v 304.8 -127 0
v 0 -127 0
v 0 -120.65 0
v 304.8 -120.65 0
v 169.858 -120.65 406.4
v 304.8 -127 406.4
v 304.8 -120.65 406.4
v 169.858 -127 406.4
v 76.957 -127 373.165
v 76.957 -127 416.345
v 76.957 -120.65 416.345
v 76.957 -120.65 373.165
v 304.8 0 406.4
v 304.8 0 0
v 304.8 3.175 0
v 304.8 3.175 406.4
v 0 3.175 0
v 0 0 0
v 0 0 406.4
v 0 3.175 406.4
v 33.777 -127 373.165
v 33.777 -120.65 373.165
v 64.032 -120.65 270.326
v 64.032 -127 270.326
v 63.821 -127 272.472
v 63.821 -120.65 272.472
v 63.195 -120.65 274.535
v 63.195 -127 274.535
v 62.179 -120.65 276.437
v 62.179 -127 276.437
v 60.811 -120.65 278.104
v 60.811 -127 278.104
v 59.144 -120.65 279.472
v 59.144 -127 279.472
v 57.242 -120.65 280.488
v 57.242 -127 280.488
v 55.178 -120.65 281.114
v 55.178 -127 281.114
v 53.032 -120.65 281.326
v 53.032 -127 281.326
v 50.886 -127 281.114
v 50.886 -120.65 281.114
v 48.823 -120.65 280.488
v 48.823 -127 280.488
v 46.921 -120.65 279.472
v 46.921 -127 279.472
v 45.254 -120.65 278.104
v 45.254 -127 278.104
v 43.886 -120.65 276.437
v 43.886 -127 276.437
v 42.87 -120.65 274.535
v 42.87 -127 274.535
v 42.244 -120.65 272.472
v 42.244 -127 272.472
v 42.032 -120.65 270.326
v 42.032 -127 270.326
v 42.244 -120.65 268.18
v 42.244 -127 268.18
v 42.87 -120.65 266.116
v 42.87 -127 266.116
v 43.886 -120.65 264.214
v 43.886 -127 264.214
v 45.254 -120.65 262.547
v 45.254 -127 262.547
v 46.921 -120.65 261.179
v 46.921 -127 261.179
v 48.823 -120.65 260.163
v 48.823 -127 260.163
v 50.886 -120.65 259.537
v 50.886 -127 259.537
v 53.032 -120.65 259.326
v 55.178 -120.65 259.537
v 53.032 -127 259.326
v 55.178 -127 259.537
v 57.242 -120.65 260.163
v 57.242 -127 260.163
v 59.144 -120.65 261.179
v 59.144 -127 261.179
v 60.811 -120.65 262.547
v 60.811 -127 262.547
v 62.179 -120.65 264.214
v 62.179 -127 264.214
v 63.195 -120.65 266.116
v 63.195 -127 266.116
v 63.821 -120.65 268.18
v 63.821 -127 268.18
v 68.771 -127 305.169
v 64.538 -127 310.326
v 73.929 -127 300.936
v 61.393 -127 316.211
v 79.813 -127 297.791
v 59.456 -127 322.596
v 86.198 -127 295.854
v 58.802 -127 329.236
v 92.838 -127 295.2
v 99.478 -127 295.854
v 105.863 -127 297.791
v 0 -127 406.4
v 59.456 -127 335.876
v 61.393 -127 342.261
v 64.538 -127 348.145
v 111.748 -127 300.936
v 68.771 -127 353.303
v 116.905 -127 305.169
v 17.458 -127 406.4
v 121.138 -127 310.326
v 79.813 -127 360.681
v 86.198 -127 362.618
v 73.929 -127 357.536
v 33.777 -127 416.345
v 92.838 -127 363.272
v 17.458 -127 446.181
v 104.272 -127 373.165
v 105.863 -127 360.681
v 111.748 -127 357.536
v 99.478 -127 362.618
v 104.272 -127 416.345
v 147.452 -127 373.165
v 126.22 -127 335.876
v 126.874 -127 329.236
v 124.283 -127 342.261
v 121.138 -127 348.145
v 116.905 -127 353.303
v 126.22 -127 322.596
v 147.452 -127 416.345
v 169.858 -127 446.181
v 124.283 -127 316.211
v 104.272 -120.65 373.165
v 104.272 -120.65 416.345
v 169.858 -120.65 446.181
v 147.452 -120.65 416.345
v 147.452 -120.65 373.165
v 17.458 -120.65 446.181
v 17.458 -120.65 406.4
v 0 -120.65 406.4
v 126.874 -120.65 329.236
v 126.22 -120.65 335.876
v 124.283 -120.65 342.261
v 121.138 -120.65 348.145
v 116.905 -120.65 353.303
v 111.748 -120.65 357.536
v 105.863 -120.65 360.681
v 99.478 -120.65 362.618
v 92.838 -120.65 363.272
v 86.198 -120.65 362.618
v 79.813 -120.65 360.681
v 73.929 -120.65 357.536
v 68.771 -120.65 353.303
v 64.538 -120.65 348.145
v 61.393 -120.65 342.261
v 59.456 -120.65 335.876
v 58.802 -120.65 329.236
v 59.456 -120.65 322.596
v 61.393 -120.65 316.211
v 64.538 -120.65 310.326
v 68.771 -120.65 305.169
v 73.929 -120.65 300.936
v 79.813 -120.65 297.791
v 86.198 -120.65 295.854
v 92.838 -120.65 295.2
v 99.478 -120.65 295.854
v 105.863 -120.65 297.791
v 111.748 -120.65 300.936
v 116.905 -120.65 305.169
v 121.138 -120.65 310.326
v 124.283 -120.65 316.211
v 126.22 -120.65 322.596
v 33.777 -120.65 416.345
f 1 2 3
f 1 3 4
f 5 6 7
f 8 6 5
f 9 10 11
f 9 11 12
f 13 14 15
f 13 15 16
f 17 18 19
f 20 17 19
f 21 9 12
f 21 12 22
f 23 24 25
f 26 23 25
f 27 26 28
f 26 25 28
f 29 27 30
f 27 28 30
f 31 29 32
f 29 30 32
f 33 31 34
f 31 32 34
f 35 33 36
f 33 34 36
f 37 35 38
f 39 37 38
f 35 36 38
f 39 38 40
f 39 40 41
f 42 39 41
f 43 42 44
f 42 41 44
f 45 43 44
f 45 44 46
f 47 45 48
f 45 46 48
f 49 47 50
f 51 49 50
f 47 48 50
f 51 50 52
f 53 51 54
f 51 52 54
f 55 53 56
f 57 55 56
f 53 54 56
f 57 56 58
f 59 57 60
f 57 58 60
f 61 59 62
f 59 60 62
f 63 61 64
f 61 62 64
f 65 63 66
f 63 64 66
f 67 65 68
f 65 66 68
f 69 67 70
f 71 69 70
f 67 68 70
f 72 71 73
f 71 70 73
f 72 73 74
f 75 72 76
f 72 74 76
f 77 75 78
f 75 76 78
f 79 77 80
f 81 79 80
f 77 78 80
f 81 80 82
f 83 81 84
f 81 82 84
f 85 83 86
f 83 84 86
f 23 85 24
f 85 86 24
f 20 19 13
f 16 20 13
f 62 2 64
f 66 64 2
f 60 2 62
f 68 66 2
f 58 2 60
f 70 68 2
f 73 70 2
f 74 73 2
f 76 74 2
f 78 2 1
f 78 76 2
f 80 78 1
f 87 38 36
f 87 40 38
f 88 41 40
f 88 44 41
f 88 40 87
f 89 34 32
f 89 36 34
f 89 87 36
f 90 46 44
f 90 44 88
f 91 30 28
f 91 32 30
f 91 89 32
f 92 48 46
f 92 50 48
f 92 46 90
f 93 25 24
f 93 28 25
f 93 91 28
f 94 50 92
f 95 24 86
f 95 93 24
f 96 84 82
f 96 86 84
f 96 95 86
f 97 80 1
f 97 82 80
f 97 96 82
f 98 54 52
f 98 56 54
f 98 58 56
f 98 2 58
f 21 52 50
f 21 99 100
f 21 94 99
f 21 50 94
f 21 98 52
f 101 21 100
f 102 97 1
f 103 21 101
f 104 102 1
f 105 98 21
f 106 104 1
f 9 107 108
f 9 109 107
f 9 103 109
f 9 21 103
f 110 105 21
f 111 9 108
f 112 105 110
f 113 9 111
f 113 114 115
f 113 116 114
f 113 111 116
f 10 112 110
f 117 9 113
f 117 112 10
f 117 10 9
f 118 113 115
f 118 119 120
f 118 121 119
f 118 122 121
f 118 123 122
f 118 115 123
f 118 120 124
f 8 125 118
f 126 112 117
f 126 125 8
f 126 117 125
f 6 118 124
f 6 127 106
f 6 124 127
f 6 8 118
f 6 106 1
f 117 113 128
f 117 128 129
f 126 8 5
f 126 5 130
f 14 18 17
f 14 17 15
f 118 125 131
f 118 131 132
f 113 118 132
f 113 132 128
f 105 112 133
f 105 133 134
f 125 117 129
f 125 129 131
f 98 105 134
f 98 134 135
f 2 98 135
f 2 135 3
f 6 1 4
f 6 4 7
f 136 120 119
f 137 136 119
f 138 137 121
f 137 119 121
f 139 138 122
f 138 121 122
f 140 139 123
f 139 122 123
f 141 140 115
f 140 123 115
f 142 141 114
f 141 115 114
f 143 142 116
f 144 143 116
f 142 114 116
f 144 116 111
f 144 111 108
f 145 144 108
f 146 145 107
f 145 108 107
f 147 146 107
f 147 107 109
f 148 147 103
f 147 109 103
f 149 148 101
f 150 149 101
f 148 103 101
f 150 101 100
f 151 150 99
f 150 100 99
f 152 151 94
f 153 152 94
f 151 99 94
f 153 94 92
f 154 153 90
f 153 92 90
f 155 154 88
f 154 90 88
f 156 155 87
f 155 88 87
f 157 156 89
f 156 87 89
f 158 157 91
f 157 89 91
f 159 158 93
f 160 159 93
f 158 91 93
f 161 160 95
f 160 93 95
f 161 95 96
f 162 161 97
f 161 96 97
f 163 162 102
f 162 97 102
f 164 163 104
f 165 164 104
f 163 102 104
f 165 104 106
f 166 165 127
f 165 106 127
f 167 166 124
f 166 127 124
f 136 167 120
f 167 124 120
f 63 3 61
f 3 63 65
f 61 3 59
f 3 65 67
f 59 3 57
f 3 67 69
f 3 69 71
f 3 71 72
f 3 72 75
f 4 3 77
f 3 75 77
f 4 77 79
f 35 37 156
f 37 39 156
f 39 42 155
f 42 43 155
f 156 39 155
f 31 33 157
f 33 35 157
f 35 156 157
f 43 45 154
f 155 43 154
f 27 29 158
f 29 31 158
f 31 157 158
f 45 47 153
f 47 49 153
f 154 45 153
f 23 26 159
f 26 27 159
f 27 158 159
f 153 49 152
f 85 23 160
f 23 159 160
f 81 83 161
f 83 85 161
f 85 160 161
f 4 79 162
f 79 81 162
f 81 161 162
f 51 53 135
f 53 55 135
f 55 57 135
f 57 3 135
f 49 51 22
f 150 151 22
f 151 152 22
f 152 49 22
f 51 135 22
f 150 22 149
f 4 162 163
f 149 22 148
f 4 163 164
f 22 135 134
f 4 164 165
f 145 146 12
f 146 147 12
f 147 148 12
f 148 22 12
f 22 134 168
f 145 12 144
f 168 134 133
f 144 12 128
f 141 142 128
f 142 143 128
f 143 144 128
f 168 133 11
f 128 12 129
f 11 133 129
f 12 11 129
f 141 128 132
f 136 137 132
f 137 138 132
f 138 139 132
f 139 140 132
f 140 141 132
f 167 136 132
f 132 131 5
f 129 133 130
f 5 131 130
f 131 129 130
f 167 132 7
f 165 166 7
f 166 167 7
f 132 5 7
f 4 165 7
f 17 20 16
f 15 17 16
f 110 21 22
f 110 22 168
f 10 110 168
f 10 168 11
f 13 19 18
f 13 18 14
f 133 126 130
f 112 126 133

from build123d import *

# Parameters (mm, degrees)
F0_W     = 304.8
F0_H     = 406.4
F1_DEPTH = 3.175
F3_R     = 11
F3_R_2   = 34.036
F5_DEPTH = 6.35


with BuildPart() as f1:
    # F0 (on Front) → F1 (new body)
    with BuildSketch(Plane.XZ):
        with Locations((152.4, 203.2)):
            Rectangle(F0_W, F0_H)
    extrude(amount=-F1_DEPTH)


with BuildPart() as f5:
    # F3 (on offset) → F5 (new body)
    with BuildSketch(Plane.XZ.offset(127)):
        Polygon((33.7773003054, 406.4), (33.7773003054, 416.3452088833), (76.9573003054, 416.3452088833), (76.9573003054, 406.4), (104.271531105, 406.4), (104.271531105, 416.3452088833), (147.451531105, 416.3452088833), (147.451531105, 406.4), (169.857814908, 406.4), (169.857814908, 446.1813612461), (17.457814908, 446.1813612461), (17.457814908, 406.4), align=None)
        Polygon((33.7773003054, 373.1652088833), (33.7773003054, 406.4), (17.457814908, 406.4), (17.457814908, 242.9813612461), (169.857814908, 242.9813612461), (169.857814908, 406.4), (147.451531105, 406.4), (147.451531105, 373.1652088833), (104.271531105, 373.1652088833), (104.271531105, 406.4), (76.9573003054, 406.4), (76.9573003054, 373.1652088833), align=None)
        with Locations((53.0323646963, 270.3256607056)):
            Circle(F3_R, mode=Mode.SUBTRACT)
        with Locations((92.83824265, 329.2357623577)):
            Circle(F3_R_2, mode=Mode.SUBTRACT)
        Polygon((17.457814908, 242.9813612461), (17.457814908, 406.4), (0, 406.4), (0, 0), (304.8, 0), (304.8, 406.4), (169.857814908, 406.4), (169.857814908, 242.9813612461), align=None)
    extrude(amount=-F5_DEPTH)


solid = Compound([f1.part, f5.part])
